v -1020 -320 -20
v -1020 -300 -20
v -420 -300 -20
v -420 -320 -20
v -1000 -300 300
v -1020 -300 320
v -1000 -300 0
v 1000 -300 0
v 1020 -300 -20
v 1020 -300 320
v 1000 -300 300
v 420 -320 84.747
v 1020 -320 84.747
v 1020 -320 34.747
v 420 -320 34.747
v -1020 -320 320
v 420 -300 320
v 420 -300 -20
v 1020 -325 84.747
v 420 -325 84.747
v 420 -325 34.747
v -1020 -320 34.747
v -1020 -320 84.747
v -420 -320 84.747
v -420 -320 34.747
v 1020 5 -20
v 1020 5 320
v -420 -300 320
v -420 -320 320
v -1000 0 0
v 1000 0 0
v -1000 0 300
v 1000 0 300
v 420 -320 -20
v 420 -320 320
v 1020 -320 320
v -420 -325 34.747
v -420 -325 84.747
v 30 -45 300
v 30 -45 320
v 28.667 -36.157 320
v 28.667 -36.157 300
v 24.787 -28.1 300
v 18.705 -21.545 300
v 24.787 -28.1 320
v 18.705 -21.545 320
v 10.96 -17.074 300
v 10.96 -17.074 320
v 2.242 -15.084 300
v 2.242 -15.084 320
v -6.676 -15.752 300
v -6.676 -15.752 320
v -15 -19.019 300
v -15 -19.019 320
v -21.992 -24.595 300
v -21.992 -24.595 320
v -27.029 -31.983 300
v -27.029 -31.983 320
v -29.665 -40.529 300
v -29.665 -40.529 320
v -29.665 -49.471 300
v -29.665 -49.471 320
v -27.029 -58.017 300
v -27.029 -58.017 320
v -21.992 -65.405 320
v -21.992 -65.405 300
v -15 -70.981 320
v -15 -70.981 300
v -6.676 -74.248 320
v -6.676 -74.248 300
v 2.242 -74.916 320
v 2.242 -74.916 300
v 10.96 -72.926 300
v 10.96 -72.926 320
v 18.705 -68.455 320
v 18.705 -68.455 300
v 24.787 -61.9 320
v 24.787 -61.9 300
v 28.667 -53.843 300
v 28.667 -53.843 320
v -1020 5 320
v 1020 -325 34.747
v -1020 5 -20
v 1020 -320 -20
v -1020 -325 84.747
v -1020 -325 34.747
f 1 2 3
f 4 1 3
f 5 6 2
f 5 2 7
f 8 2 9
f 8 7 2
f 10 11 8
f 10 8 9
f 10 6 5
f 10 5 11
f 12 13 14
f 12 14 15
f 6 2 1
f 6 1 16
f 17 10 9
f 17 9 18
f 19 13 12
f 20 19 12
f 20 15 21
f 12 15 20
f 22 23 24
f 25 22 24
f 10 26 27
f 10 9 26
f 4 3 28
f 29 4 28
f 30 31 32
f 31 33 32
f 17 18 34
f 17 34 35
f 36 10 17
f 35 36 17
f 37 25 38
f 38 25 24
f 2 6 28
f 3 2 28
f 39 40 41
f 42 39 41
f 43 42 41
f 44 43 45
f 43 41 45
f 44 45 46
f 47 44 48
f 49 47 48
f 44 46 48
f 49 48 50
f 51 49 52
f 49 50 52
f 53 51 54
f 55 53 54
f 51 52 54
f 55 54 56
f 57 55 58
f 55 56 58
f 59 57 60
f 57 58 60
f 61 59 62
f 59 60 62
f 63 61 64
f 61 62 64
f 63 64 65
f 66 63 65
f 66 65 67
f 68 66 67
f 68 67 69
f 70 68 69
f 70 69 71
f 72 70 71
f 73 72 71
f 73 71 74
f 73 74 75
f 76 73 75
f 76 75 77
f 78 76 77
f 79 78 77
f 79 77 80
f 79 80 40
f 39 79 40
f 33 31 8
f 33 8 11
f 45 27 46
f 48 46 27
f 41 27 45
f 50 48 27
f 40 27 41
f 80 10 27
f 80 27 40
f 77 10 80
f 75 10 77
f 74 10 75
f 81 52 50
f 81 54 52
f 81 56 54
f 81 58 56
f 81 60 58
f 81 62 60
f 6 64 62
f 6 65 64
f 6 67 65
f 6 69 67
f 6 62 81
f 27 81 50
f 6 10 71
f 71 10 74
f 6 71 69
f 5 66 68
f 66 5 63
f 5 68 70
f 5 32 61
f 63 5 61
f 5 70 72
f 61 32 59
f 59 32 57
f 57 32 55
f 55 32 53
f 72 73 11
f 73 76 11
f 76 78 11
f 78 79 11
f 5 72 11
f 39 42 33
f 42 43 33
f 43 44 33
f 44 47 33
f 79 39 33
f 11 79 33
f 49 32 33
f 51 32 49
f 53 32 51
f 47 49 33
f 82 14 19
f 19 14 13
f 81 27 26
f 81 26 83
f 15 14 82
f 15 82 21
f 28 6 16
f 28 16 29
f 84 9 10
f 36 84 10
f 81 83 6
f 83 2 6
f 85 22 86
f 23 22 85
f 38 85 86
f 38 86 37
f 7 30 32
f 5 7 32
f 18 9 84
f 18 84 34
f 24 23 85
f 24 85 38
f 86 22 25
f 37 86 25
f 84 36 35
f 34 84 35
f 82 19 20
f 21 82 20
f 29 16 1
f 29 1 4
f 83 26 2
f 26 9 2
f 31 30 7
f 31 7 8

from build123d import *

# Parameters (mm, degrees)
F0_W      = 2040
F0_H      = 340
F0_W_2    = 2000
F0_H_2    = 300
F1_DEPTH  = 300
F2_W      = 2040
F2_H      = 340
F3_DEPTH  = 5
F4_W      = 600
F4_H      = 340
F5_DEPTH  = 20
F7_W      = 600
F7_H      = 50
F8_DEPTH  = 5
F10_R     = 30
F11_DEPTH = 50


with BuildPart() as f1:
    # F0 (on Front) → F1 (new body)
    with BuildSketch(Plane.XZ):
        with Locations((0, 150)):
            Rectangle(F0_W, F0_H)
        with Locations((0, 150)):
            Rectangle(F0_W_2, F0_H_2, mode=Mode.SUBTRACT)
    extrude(amount=F1_DEPTH)

    # F2 (on face) → F3 (join)
    with BuildSketch(Plane(origin=(0, 0, 0), x_dir=(-1, 0, 0), z_dir=(0, 1, 0))):
        with Locations((0, 150)):
            Rectangle(F2_W, F2_H)
    extrude(amount=F3_DEPTH)

    # F10 (on face) → F11 (cut)
    with BuildSketch(Plane.XY.offset(320)):
        with Locations((0, -45)):
            Circle(F10_R)
    extrude(amount=-F11_DEPTH, mode=Mode.SUBTRACT)


with BuildPart() as f5:
    # F4 (on face) → F5 (new body)
    with BuildSketch(Plane.XZ.offset(300)):
        with Locations((-720, 150)):
            Rectangle(F4_W, F4_H)
    extrude(amount=F5_DEPTH)


with BuildPart() as f6_1:
    # F6: instance of F5
    add(f5.part.mirror(Plane.YZ))


with BuildPart() as f8:
    # F7 (on face) → F8 (new body)
    with BuildSketch(Plane.XZ.offset(320)):
        with Locations((-720, 59.747098)):
            Rectangle(F7_W, F7_H)
    extrude(amount=F8_DEPTH)


with BuildPart() as f9_1:
    # F9: instance of F8
    add(f8.part.mirror(Plane.YZ))


solid = Compound([f1.part, f5.part, f6_1.part, f8.part, f9_1.part])
